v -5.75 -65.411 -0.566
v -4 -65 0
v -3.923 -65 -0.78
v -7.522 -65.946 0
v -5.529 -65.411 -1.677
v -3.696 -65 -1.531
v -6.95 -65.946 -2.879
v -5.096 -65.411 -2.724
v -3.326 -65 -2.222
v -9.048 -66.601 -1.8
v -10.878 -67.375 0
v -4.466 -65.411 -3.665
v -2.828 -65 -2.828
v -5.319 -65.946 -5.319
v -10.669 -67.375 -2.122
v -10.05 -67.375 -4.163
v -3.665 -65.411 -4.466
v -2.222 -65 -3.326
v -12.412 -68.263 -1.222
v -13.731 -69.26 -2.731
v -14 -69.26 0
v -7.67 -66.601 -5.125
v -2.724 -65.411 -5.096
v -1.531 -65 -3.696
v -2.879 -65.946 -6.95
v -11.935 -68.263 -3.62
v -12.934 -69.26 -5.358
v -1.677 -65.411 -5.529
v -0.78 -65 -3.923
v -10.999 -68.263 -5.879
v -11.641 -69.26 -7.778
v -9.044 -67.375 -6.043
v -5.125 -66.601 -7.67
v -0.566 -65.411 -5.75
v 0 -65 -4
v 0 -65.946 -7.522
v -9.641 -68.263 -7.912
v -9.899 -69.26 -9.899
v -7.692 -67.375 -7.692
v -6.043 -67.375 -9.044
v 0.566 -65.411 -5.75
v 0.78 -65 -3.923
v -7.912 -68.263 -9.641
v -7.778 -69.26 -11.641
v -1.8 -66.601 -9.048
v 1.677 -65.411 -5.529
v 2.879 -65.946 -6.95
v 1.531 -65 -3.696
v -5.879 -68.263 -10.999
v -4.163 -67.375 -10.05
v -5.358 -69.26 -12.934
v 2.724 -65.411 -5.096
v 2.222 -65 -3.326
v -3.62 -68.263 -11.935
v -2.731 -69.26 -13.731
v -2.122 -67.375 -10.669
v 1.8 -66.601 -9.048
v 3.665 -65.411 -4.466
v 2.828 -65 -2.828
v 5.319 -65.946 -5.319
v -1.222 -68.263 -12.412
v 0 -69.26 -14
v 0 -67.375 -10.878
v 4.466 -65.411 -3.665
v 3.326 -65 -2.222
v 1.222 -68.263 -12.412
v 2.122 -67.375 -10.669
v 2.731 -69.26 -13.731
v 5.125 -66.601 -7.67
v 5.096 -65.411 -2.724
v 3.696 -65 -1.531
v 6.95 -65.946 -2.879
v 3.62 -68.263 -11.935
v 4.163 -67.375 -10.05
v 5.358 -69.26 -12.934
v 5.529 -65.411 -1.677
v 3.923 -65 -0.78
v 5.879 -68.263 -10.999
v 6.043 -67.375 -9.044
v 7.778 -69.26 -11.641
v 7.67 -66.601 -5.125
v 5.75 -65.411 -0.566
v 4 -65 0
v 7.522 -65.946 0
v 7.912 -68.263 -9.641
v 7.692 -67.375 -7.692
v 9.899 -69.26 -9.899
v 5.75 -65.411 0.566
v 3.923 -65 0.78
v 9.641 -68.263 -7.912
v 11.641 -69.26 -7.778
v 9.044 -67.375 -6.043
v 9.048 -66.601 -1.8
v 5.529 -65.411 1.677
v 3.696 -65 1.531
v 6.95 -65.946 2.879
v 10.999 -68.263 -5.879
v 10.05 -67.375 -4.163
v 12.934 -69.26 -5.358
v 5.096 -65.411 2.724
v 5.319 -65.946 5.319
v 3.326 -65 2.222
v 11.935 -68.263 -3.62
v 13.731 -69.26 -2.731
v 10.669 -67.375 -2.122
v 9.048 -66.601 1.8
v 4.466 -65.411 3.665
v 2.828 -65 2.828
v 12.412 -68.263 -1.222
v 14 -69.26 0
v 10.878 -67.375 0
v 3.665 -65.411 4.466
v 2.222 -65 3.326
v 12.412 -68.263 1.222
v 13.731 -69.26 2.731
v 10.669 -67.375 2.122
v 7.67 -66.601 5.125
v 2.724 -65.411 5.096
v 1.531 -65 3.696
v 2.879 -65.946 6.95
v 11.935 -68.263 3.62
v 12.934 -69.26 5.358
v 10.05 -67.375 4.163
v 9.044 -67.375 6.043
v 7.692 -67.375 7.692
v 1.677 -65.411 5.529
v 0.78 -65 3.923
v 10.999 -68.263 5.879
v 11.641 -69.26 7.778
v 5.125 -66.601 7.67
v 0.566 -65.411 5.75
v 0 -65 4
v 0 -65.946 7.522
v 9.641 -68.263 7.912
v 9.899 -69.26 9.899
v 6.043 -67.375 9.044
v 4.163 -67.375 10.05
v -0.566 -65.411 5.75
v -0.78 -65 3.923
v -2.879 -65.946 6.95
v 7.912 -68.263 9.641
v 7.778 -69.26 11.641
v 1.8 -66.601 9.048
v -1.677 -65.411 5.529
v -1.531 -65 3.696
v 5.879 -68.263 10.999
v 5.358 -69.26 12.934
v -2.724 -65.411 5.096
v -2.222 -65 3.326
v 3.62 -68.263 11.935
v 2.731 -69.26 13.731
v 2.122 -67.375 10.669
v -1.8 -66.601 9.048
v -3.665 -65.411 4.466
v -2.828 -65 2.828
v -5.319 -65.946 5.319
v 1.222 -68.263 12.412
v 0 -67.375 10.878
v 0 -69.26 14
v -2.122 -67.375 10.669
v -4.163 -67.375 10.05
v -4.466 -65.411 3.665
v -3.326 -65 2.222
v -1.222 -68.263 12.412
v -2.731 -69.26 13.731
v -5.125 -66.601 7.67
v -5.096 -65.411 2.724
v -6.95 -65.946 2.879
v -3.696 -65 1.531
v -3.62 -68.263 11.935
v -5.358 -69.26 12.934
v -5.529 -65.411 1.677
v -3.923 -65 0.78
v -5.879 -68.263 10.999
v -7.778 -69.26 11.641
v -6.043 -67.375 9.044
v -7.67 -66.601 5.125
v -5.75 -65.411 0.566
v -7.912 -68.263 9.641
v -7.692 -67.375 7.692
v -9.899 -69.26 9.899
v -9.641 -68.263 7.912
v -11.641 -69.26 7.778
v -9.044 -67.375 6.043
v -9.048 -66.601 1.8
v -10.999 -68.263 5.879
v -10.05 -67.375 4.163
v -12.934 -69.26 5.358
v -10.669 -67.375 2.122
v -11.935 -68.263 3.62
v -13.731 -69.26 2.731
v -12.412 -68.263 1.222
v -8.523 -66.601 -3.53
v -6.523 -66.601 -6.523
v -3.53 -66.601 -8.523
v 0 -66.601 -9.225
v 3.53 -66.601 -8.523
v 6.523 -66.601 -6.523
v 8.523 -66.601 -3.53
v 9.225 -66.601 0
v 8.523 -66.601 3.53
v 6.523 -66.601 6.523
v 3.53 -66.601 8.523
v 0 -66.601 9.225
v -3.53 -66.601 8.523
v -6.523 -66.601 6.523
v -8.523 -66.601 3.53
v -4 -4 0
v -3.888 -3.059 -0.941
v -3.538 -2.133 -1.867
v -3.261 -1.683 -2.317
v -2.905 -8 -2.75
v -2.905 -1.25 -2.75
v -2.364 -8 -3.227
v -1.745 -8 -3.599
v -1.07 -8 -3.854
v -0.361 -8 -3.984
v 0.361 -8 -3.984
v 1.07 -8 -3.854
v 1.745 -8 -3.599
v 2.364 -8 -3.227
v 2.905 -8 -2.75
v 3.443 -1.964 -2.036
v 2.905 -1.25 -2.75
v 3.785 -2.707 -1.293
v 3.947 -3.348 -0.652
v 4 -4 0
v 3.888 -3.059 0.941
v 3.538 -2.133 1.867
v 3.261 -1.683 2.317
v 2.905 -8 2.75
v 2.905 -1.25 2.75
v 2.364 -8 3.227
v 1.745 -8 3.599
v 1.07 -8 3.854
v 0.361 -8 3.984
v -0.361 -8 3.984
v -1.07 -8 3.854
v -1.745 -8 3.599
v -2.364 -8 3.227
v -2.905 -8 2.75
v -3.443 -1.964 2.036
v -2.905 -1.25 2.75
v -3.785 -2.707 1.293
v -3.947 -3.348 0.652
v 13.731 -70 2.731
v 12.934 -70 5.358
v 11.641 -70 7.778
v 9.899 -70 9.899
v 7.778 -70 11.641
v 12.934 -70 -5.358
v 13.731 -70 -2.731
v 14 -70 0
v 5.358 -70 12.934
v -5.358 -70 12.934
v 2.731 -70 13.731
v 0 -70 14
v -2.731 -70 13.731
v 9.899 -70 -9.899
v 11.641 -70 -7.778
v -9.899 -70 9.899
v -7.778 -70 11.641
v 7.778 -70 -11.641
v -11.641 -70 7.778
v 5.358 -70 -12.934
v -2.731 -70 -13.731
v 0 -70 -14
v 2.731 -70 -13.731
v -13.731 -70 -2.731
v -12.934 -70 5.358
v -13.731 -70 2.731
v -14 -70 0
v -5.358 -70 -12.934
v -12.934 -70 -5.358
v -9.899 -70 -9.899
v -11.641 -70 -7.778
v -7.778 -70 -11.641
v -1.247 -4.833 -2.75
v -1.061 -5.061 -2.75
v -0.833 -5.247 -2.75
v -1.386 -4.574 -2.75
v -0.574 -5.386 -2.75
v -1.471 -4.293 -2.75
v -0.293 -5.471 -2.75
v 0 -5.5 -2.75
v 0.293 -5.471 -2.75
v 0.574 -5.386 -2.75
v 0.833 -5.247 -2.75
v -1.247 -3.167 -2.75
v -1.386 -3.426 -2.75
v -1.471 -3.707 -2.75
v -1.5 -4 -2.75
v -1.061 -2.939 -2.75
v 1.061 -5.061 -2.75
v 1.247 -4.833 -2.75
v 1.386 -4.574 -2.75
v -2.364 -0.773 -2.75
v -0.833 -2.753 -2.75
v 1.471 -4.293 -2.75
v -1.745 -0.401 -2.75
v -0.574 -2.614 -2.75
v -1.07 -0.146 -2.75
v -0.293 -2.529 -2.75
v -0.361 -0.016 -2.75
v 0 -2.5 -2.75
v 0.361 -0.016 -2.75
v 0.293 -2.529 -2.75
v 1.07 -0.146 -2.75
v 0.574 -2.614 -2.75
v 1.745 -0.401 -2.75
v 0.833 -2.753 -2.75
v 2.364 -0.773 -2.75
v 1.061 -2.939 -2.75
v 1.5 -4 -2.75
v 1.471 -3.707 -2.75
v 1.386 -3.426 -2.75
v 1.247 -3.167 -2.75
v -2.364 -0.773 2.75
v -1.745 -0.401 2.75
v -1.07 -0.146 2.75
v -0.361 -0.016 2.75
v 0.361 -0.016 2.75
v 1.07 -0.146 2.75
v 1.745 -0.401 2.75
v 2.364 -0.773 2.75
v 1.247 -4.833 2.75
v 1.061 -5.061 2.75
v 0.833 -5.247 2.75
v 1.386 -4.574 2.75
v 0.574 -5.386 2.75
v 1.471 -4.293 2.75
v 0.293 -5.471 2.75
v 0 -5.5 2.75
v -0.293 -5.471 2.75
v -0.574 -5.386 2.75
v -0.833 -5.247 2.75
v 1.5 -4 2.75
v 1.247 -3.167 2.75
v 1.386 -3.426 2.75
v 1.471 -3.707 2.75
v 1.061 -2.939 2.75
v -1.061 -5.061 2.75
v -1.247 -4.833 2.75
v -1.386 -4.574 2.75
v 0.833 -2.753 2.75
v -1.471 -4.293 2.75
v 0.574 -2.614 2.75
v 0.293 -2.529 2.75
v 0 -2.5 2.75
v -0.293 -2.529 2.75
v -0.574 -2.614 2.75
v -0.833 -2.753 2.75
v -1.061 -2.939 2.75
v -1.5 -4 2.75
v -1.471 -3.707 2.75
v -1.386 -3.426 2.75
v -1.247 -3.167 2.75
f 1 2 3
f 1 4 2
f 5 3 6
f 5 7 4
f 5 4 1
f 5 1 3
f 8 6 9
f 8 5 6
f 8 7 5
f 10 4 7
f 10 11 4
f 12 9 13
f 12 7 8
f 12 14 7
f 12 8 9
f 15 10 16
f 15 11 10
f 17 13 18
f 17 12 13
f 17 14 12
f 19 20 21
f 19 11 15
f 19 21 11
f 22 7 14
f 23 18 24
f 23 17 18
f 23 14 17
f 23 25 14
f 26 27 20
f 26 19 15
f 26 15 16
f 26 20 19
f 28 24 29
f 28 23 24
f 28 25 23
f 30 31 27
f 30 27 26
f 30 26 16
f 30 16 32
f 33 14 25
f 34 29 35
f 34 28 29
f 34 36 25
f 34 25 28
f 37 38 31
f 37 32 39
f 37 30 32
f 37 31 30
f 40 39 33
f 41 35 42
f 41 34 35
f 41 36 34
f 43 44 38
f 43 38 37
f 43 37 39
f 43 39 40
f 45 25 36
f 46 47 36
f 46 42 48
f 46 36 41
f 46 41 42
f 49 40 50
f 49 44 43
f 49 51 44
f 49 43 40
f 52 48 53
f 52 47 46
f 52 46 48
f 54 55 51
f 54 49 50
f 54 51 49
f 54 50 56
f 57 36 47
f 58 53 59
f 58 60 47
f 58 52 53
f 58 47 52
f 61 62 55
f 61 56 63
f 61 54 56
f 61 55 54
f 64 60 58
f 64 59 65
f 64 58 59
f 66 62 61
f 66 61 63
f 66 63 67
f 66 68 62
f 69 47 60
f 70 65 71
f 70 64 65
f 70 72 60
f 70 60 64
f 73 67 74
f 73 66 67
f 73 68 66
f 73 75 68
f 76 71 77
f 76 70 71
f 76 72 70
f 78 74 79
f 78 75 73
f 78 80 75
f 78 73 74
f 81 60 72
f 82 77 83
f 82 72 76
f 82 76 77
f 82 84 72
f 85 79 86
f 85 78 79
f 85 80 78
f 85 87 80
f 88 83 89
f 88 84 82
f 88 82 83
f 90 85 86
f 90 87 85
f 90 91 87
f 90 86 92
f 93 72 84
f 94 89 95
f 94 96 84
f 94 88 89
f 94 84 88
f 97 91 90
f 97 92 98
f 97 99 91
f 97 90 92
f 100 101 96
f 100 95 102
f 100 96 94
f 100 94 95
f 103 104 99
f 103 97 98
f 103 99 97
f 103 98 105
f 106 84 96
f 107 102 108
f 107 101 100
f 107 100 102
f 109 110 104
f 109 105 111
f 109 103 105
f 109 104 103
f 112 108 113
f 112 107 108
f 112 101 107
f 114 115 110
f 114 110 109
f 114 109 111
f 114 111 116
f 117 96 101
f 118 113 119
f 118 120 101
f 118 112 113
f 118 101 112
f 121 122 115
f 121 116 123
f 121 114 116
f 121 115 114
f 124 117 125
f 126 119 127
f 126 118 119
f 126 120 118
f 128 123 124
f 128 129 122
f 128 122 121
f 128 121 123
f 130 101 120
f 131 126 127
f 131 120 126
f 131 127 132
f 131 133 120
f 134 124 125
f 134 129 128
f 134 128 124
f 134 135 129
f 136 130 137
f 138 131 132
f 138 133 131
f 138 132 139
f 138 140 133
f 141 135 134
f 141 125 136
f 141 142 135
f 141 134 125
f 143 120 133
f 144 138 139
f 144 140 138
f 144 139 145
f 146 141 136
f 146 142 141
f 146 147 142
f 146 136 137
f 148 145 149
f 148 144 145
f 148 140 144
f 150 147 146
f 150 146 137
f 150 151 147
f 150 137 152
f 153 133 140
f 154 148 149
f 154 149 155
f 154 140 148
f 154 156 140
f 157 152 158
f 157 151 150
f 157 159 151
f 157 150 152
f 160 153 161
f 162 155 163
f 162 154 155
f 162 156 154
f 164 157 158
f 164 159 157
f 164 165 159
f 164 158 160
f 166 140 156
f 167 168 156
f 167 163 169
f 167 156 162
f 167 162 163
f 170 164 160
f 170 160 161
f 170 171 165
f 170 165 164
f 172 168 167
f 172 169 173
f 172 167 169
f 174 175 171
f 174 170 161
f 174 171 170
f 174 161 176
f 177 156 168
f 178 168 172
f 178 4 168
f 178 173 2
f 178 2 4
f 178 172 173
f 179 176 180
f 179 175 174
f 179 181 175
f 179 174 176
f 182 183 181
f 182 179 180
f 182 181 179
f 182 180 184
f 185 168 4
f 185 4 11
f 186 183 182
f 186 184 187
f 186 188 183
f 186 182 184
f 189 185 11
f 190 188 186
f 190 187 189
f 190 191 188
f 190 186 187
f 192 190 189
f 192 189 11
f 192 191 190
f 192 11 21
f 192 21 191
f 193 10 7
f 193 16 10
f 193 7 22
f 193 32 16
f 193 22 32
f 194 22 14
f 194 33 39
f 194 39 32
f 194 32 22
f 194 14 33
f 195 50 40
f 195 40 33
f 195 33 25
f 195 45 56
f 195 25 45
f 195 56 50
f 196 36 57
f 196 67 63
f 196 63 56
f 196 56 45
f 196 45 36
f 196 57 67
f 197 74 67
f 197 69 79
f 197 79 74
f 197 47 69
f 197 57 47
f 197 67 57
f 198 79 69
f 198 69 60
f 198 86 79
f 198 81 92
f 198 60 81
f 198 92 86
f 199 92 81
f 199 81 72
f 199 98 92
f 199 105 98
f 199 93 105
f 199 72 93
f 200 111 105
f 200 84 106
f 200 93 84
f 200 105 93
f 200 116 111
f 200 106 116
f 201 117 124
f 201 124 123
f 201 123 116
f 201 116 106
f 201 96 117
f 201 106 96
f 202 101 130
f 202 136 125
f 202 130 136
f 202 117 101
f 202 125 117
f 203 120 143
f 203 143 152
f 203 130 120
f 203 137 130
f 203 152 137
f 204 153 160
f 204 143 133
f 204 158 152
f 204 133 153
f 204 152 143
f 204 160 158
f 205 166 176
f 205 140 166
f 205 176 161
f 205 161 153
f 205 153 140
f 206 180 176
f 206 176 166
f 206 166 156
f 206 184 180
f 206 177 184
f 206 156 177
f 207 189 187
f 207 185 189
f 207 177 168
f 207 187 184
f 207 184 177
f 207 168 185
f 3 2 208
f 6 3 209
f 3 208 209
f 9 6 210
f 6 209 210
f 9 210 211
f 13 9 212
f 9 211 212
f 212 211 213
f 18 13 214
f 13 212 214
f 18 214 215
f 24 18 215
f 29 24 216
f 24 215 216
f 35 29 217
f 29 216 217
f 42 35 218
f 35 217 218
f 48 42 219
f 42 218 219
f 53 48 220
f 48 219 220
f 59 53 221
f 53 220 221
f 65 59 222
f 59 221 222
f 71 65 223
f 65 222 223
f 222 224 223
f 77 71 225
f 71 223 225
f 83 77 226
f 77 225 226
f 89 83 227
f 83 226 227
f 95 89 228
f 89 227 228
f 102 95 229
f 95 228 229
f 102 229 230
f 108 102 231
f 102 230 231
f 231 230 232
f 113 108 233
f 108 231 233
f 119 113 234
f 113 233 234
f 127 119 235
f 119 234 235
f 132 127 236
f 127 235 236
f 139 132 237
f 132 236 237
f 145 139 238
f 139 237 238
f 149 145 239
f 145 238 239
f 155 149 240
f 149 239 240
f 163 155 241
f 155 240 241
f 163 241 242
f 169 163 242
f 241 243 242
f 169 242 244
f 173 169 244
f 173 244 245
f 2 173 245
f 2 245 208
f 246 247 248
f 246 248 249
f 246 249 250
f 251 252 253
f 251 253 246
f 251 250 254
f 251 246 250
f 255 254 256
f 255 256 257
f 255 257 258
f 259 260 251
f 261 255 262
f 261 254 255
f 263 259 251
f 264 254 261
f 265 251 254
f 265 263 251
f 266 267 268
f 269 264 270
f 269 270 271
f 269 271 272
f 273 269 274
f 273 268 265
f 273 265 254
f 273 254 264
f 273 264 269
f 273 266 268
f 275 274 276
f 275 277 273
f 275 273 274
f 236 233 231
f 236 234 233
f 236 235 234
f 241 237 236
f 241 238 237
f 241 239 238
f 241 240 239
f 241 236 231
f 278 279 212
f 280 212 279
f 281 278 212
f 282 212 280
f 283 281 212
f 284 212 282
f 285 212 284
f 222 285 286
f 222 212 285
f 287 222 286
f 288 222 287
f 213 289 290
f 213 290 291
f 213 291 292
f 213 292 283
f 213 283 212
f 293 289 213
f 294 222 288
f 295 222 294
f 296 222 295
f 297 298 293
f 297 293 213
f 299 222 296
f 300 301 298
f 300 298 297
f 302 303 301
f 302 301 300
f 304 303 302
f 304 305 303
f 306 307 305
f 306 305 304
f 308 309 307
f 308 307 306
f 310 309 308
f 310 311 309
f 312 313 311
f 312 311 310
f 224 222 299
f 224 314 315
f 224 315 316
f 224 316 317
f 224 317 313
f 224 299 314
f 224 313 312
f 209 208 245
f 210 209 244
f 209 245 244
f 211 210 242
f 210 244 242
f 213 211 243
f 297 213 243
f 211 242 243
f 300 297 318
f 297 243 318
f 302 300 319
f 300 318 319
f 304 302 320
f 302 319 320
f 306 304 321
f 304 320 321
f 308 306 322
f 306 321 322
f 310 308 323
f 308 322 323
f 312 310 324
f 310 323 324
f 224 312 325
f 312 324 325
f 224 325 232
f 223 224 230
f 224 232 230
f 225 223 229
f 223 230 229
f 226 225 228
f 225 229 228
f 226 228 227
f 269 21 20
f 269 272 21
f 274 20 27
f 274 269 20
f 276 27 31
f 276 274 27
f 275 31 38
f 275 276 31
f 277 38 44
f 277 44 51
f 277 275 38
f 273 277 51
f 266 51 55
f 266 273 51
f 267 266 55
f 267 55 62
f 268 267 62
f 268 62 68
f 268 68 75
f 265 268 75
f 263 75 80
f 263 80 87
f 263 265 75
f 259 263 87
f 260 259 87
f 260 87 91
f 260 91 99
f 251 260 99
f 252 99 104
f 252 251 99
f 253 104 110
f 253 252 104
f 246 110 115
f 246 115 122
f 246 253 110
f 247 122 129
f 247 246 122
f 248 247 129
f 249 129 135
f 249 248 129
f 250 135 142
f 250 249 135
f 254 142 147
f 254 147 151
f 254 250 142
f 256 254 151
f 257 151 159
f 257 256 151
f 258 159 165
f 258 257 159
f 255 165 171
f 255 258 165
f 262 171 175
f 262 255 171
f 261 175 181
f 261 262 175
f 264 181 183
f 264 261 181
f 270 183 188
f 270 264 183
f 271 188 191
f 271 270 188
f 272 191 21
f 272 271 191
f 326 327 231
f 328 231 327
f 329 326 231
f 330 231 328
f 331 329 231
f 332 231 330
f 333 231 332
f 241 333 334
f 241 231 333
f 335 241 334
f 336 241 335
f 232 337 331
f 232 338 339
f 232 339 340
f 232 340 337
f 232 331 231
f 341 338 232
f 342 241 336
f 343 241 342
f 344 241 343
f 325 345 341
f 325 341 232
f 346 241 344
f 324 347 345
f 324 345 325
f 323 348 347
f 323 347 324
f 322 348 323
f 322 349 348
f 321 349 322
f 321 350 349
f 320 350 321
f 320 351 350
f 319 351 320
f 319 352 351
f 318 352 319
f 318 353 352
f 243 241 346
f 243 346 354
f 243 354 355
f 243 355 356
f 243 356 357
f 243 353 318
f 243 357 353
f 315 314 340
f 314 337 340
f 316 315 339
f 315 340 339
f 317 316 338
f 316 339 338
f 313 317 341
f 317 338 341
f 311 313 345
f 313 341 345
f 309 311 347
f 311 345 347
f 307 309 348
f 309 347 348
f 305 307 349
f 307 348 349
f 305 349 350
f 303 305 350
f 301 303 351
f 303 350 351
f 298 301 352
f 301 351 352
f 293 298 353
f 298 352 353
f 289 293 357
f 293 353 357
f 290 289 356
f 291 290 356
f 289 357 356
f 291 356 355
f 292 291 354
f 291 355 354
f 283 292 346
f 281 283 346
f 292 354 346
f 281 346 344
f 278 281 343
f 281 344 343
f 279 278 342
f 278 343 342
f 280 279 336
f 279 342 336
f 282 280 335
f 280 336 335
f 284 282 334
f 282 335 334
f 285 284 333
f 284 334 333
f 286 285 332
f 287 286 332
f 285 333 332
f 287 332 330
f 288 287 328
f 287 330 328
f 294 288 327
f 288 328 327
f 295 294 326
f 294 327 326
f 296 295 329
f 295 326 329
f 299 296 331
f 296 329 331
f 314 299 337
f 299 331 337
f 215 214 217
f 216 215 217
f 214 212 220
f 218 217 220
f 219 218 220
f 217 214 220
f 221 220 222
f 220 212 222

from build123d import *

# Parameters (mm, degrees)
SKETCH1_W               = 4
SKETCH1_H               = 65
CUT_EXTRUDE2_DEPTH      = 15.0000001
CUT_EXTRUDE2_DEPTH_BACK = 15.0000001
SKETCH3_W               = 1.25
SKETCH3_H               = 8
CUT_EXTRUDE3_DEPTH      = 15.0000001
CUT_EXTRUDE3_DEPTH_BACK = 15.0000001


with BuildPart() as part:
    # Sketch1 → Revolve1 (revolve)
    with BuildSketch(Plane.XY):
        with BuildLine():
            ThreePointArc((-4, -65), (-9.225090437, -66.601484736), (-14, -69.259785338))
            Line((-14, -69.259785338), (-14, -70))
            Line((-14, -70), (0, -70))
            Line((0, -70), (0, -65))
            Line((0, -65), (-4, -65))
        make_face()
        with Locations((-2, -32.5)):
            Rectangle(SKETCH1_W, SKETCH1_H)
    revolve(axis=Axis((0, 0, 0), (0, -1, 0)))

    # Sketch2 → Cut-Extrude2 (cut, two sides)
    with BuildSketch(Plane.XY) as cut_extrude2_sk:
        with BuildLine():
            Line((-4, 0), (-4, -4))
            ThreePointArc((-4, -4), (-2.828427125, -1.171572875), (0, 0))
            Line((0, 0), (-4, 0))
        make_face()
        with BuildLine():
            ThreePointArc((0, 0), (2.828427125, -1.171572875), (4, -4))
            Line((4, -4), (4, 0))
            Line((4, 0), (0, 0))
        make_face()
        with BuildLine():
            ThreePointArc((-1.5, -4), (0, -5.5), (1.5, -4))
            Line((1.5, -4), (-1.5, -4))
        make_face()
        with BuildLine():
            Line((-1.5, -4), (1.5, -4))
            ThreePointArc((1.5, -4), (0, -2.5), (-1.5, -4))
        make_face()
    extrude(amount=CUT_EXTRUDE2_DEPTH, mode=Mode.SUBTRACT)
    extrude(cut_extrude2_sk.sketch, amount=-CUT_EXTRUDE2_DEPTH_BACK, mode=Mode.SUBTRACT)

    # Sketch3 → Cut-Extrude3 (cut, two sides)
    with BuildSketch(Plane(origin=(0, 0, 0), x_dir=(0, 0, -1), z_dir=(1, 0, 0))) as cut_extrude3_sk:
        with Locations((-3.375, -4)):
            Rectangle(SKETCH3_W, SKETCH3_H)
        with Locations((3.375, -4)):
            Rectangle(SKETCH3_W, SKETCH3_H)
    extrude(amount=CUT_EXTRUDE3_DEPTH, mode=Mode.SUBTRACT)
    extrude(cut_extrude3_sk.sketch, amount=-CUT_EXTRUDE3_DEPTH_BACK, mode=Mode.SUBTRACT)


solid = part.part
